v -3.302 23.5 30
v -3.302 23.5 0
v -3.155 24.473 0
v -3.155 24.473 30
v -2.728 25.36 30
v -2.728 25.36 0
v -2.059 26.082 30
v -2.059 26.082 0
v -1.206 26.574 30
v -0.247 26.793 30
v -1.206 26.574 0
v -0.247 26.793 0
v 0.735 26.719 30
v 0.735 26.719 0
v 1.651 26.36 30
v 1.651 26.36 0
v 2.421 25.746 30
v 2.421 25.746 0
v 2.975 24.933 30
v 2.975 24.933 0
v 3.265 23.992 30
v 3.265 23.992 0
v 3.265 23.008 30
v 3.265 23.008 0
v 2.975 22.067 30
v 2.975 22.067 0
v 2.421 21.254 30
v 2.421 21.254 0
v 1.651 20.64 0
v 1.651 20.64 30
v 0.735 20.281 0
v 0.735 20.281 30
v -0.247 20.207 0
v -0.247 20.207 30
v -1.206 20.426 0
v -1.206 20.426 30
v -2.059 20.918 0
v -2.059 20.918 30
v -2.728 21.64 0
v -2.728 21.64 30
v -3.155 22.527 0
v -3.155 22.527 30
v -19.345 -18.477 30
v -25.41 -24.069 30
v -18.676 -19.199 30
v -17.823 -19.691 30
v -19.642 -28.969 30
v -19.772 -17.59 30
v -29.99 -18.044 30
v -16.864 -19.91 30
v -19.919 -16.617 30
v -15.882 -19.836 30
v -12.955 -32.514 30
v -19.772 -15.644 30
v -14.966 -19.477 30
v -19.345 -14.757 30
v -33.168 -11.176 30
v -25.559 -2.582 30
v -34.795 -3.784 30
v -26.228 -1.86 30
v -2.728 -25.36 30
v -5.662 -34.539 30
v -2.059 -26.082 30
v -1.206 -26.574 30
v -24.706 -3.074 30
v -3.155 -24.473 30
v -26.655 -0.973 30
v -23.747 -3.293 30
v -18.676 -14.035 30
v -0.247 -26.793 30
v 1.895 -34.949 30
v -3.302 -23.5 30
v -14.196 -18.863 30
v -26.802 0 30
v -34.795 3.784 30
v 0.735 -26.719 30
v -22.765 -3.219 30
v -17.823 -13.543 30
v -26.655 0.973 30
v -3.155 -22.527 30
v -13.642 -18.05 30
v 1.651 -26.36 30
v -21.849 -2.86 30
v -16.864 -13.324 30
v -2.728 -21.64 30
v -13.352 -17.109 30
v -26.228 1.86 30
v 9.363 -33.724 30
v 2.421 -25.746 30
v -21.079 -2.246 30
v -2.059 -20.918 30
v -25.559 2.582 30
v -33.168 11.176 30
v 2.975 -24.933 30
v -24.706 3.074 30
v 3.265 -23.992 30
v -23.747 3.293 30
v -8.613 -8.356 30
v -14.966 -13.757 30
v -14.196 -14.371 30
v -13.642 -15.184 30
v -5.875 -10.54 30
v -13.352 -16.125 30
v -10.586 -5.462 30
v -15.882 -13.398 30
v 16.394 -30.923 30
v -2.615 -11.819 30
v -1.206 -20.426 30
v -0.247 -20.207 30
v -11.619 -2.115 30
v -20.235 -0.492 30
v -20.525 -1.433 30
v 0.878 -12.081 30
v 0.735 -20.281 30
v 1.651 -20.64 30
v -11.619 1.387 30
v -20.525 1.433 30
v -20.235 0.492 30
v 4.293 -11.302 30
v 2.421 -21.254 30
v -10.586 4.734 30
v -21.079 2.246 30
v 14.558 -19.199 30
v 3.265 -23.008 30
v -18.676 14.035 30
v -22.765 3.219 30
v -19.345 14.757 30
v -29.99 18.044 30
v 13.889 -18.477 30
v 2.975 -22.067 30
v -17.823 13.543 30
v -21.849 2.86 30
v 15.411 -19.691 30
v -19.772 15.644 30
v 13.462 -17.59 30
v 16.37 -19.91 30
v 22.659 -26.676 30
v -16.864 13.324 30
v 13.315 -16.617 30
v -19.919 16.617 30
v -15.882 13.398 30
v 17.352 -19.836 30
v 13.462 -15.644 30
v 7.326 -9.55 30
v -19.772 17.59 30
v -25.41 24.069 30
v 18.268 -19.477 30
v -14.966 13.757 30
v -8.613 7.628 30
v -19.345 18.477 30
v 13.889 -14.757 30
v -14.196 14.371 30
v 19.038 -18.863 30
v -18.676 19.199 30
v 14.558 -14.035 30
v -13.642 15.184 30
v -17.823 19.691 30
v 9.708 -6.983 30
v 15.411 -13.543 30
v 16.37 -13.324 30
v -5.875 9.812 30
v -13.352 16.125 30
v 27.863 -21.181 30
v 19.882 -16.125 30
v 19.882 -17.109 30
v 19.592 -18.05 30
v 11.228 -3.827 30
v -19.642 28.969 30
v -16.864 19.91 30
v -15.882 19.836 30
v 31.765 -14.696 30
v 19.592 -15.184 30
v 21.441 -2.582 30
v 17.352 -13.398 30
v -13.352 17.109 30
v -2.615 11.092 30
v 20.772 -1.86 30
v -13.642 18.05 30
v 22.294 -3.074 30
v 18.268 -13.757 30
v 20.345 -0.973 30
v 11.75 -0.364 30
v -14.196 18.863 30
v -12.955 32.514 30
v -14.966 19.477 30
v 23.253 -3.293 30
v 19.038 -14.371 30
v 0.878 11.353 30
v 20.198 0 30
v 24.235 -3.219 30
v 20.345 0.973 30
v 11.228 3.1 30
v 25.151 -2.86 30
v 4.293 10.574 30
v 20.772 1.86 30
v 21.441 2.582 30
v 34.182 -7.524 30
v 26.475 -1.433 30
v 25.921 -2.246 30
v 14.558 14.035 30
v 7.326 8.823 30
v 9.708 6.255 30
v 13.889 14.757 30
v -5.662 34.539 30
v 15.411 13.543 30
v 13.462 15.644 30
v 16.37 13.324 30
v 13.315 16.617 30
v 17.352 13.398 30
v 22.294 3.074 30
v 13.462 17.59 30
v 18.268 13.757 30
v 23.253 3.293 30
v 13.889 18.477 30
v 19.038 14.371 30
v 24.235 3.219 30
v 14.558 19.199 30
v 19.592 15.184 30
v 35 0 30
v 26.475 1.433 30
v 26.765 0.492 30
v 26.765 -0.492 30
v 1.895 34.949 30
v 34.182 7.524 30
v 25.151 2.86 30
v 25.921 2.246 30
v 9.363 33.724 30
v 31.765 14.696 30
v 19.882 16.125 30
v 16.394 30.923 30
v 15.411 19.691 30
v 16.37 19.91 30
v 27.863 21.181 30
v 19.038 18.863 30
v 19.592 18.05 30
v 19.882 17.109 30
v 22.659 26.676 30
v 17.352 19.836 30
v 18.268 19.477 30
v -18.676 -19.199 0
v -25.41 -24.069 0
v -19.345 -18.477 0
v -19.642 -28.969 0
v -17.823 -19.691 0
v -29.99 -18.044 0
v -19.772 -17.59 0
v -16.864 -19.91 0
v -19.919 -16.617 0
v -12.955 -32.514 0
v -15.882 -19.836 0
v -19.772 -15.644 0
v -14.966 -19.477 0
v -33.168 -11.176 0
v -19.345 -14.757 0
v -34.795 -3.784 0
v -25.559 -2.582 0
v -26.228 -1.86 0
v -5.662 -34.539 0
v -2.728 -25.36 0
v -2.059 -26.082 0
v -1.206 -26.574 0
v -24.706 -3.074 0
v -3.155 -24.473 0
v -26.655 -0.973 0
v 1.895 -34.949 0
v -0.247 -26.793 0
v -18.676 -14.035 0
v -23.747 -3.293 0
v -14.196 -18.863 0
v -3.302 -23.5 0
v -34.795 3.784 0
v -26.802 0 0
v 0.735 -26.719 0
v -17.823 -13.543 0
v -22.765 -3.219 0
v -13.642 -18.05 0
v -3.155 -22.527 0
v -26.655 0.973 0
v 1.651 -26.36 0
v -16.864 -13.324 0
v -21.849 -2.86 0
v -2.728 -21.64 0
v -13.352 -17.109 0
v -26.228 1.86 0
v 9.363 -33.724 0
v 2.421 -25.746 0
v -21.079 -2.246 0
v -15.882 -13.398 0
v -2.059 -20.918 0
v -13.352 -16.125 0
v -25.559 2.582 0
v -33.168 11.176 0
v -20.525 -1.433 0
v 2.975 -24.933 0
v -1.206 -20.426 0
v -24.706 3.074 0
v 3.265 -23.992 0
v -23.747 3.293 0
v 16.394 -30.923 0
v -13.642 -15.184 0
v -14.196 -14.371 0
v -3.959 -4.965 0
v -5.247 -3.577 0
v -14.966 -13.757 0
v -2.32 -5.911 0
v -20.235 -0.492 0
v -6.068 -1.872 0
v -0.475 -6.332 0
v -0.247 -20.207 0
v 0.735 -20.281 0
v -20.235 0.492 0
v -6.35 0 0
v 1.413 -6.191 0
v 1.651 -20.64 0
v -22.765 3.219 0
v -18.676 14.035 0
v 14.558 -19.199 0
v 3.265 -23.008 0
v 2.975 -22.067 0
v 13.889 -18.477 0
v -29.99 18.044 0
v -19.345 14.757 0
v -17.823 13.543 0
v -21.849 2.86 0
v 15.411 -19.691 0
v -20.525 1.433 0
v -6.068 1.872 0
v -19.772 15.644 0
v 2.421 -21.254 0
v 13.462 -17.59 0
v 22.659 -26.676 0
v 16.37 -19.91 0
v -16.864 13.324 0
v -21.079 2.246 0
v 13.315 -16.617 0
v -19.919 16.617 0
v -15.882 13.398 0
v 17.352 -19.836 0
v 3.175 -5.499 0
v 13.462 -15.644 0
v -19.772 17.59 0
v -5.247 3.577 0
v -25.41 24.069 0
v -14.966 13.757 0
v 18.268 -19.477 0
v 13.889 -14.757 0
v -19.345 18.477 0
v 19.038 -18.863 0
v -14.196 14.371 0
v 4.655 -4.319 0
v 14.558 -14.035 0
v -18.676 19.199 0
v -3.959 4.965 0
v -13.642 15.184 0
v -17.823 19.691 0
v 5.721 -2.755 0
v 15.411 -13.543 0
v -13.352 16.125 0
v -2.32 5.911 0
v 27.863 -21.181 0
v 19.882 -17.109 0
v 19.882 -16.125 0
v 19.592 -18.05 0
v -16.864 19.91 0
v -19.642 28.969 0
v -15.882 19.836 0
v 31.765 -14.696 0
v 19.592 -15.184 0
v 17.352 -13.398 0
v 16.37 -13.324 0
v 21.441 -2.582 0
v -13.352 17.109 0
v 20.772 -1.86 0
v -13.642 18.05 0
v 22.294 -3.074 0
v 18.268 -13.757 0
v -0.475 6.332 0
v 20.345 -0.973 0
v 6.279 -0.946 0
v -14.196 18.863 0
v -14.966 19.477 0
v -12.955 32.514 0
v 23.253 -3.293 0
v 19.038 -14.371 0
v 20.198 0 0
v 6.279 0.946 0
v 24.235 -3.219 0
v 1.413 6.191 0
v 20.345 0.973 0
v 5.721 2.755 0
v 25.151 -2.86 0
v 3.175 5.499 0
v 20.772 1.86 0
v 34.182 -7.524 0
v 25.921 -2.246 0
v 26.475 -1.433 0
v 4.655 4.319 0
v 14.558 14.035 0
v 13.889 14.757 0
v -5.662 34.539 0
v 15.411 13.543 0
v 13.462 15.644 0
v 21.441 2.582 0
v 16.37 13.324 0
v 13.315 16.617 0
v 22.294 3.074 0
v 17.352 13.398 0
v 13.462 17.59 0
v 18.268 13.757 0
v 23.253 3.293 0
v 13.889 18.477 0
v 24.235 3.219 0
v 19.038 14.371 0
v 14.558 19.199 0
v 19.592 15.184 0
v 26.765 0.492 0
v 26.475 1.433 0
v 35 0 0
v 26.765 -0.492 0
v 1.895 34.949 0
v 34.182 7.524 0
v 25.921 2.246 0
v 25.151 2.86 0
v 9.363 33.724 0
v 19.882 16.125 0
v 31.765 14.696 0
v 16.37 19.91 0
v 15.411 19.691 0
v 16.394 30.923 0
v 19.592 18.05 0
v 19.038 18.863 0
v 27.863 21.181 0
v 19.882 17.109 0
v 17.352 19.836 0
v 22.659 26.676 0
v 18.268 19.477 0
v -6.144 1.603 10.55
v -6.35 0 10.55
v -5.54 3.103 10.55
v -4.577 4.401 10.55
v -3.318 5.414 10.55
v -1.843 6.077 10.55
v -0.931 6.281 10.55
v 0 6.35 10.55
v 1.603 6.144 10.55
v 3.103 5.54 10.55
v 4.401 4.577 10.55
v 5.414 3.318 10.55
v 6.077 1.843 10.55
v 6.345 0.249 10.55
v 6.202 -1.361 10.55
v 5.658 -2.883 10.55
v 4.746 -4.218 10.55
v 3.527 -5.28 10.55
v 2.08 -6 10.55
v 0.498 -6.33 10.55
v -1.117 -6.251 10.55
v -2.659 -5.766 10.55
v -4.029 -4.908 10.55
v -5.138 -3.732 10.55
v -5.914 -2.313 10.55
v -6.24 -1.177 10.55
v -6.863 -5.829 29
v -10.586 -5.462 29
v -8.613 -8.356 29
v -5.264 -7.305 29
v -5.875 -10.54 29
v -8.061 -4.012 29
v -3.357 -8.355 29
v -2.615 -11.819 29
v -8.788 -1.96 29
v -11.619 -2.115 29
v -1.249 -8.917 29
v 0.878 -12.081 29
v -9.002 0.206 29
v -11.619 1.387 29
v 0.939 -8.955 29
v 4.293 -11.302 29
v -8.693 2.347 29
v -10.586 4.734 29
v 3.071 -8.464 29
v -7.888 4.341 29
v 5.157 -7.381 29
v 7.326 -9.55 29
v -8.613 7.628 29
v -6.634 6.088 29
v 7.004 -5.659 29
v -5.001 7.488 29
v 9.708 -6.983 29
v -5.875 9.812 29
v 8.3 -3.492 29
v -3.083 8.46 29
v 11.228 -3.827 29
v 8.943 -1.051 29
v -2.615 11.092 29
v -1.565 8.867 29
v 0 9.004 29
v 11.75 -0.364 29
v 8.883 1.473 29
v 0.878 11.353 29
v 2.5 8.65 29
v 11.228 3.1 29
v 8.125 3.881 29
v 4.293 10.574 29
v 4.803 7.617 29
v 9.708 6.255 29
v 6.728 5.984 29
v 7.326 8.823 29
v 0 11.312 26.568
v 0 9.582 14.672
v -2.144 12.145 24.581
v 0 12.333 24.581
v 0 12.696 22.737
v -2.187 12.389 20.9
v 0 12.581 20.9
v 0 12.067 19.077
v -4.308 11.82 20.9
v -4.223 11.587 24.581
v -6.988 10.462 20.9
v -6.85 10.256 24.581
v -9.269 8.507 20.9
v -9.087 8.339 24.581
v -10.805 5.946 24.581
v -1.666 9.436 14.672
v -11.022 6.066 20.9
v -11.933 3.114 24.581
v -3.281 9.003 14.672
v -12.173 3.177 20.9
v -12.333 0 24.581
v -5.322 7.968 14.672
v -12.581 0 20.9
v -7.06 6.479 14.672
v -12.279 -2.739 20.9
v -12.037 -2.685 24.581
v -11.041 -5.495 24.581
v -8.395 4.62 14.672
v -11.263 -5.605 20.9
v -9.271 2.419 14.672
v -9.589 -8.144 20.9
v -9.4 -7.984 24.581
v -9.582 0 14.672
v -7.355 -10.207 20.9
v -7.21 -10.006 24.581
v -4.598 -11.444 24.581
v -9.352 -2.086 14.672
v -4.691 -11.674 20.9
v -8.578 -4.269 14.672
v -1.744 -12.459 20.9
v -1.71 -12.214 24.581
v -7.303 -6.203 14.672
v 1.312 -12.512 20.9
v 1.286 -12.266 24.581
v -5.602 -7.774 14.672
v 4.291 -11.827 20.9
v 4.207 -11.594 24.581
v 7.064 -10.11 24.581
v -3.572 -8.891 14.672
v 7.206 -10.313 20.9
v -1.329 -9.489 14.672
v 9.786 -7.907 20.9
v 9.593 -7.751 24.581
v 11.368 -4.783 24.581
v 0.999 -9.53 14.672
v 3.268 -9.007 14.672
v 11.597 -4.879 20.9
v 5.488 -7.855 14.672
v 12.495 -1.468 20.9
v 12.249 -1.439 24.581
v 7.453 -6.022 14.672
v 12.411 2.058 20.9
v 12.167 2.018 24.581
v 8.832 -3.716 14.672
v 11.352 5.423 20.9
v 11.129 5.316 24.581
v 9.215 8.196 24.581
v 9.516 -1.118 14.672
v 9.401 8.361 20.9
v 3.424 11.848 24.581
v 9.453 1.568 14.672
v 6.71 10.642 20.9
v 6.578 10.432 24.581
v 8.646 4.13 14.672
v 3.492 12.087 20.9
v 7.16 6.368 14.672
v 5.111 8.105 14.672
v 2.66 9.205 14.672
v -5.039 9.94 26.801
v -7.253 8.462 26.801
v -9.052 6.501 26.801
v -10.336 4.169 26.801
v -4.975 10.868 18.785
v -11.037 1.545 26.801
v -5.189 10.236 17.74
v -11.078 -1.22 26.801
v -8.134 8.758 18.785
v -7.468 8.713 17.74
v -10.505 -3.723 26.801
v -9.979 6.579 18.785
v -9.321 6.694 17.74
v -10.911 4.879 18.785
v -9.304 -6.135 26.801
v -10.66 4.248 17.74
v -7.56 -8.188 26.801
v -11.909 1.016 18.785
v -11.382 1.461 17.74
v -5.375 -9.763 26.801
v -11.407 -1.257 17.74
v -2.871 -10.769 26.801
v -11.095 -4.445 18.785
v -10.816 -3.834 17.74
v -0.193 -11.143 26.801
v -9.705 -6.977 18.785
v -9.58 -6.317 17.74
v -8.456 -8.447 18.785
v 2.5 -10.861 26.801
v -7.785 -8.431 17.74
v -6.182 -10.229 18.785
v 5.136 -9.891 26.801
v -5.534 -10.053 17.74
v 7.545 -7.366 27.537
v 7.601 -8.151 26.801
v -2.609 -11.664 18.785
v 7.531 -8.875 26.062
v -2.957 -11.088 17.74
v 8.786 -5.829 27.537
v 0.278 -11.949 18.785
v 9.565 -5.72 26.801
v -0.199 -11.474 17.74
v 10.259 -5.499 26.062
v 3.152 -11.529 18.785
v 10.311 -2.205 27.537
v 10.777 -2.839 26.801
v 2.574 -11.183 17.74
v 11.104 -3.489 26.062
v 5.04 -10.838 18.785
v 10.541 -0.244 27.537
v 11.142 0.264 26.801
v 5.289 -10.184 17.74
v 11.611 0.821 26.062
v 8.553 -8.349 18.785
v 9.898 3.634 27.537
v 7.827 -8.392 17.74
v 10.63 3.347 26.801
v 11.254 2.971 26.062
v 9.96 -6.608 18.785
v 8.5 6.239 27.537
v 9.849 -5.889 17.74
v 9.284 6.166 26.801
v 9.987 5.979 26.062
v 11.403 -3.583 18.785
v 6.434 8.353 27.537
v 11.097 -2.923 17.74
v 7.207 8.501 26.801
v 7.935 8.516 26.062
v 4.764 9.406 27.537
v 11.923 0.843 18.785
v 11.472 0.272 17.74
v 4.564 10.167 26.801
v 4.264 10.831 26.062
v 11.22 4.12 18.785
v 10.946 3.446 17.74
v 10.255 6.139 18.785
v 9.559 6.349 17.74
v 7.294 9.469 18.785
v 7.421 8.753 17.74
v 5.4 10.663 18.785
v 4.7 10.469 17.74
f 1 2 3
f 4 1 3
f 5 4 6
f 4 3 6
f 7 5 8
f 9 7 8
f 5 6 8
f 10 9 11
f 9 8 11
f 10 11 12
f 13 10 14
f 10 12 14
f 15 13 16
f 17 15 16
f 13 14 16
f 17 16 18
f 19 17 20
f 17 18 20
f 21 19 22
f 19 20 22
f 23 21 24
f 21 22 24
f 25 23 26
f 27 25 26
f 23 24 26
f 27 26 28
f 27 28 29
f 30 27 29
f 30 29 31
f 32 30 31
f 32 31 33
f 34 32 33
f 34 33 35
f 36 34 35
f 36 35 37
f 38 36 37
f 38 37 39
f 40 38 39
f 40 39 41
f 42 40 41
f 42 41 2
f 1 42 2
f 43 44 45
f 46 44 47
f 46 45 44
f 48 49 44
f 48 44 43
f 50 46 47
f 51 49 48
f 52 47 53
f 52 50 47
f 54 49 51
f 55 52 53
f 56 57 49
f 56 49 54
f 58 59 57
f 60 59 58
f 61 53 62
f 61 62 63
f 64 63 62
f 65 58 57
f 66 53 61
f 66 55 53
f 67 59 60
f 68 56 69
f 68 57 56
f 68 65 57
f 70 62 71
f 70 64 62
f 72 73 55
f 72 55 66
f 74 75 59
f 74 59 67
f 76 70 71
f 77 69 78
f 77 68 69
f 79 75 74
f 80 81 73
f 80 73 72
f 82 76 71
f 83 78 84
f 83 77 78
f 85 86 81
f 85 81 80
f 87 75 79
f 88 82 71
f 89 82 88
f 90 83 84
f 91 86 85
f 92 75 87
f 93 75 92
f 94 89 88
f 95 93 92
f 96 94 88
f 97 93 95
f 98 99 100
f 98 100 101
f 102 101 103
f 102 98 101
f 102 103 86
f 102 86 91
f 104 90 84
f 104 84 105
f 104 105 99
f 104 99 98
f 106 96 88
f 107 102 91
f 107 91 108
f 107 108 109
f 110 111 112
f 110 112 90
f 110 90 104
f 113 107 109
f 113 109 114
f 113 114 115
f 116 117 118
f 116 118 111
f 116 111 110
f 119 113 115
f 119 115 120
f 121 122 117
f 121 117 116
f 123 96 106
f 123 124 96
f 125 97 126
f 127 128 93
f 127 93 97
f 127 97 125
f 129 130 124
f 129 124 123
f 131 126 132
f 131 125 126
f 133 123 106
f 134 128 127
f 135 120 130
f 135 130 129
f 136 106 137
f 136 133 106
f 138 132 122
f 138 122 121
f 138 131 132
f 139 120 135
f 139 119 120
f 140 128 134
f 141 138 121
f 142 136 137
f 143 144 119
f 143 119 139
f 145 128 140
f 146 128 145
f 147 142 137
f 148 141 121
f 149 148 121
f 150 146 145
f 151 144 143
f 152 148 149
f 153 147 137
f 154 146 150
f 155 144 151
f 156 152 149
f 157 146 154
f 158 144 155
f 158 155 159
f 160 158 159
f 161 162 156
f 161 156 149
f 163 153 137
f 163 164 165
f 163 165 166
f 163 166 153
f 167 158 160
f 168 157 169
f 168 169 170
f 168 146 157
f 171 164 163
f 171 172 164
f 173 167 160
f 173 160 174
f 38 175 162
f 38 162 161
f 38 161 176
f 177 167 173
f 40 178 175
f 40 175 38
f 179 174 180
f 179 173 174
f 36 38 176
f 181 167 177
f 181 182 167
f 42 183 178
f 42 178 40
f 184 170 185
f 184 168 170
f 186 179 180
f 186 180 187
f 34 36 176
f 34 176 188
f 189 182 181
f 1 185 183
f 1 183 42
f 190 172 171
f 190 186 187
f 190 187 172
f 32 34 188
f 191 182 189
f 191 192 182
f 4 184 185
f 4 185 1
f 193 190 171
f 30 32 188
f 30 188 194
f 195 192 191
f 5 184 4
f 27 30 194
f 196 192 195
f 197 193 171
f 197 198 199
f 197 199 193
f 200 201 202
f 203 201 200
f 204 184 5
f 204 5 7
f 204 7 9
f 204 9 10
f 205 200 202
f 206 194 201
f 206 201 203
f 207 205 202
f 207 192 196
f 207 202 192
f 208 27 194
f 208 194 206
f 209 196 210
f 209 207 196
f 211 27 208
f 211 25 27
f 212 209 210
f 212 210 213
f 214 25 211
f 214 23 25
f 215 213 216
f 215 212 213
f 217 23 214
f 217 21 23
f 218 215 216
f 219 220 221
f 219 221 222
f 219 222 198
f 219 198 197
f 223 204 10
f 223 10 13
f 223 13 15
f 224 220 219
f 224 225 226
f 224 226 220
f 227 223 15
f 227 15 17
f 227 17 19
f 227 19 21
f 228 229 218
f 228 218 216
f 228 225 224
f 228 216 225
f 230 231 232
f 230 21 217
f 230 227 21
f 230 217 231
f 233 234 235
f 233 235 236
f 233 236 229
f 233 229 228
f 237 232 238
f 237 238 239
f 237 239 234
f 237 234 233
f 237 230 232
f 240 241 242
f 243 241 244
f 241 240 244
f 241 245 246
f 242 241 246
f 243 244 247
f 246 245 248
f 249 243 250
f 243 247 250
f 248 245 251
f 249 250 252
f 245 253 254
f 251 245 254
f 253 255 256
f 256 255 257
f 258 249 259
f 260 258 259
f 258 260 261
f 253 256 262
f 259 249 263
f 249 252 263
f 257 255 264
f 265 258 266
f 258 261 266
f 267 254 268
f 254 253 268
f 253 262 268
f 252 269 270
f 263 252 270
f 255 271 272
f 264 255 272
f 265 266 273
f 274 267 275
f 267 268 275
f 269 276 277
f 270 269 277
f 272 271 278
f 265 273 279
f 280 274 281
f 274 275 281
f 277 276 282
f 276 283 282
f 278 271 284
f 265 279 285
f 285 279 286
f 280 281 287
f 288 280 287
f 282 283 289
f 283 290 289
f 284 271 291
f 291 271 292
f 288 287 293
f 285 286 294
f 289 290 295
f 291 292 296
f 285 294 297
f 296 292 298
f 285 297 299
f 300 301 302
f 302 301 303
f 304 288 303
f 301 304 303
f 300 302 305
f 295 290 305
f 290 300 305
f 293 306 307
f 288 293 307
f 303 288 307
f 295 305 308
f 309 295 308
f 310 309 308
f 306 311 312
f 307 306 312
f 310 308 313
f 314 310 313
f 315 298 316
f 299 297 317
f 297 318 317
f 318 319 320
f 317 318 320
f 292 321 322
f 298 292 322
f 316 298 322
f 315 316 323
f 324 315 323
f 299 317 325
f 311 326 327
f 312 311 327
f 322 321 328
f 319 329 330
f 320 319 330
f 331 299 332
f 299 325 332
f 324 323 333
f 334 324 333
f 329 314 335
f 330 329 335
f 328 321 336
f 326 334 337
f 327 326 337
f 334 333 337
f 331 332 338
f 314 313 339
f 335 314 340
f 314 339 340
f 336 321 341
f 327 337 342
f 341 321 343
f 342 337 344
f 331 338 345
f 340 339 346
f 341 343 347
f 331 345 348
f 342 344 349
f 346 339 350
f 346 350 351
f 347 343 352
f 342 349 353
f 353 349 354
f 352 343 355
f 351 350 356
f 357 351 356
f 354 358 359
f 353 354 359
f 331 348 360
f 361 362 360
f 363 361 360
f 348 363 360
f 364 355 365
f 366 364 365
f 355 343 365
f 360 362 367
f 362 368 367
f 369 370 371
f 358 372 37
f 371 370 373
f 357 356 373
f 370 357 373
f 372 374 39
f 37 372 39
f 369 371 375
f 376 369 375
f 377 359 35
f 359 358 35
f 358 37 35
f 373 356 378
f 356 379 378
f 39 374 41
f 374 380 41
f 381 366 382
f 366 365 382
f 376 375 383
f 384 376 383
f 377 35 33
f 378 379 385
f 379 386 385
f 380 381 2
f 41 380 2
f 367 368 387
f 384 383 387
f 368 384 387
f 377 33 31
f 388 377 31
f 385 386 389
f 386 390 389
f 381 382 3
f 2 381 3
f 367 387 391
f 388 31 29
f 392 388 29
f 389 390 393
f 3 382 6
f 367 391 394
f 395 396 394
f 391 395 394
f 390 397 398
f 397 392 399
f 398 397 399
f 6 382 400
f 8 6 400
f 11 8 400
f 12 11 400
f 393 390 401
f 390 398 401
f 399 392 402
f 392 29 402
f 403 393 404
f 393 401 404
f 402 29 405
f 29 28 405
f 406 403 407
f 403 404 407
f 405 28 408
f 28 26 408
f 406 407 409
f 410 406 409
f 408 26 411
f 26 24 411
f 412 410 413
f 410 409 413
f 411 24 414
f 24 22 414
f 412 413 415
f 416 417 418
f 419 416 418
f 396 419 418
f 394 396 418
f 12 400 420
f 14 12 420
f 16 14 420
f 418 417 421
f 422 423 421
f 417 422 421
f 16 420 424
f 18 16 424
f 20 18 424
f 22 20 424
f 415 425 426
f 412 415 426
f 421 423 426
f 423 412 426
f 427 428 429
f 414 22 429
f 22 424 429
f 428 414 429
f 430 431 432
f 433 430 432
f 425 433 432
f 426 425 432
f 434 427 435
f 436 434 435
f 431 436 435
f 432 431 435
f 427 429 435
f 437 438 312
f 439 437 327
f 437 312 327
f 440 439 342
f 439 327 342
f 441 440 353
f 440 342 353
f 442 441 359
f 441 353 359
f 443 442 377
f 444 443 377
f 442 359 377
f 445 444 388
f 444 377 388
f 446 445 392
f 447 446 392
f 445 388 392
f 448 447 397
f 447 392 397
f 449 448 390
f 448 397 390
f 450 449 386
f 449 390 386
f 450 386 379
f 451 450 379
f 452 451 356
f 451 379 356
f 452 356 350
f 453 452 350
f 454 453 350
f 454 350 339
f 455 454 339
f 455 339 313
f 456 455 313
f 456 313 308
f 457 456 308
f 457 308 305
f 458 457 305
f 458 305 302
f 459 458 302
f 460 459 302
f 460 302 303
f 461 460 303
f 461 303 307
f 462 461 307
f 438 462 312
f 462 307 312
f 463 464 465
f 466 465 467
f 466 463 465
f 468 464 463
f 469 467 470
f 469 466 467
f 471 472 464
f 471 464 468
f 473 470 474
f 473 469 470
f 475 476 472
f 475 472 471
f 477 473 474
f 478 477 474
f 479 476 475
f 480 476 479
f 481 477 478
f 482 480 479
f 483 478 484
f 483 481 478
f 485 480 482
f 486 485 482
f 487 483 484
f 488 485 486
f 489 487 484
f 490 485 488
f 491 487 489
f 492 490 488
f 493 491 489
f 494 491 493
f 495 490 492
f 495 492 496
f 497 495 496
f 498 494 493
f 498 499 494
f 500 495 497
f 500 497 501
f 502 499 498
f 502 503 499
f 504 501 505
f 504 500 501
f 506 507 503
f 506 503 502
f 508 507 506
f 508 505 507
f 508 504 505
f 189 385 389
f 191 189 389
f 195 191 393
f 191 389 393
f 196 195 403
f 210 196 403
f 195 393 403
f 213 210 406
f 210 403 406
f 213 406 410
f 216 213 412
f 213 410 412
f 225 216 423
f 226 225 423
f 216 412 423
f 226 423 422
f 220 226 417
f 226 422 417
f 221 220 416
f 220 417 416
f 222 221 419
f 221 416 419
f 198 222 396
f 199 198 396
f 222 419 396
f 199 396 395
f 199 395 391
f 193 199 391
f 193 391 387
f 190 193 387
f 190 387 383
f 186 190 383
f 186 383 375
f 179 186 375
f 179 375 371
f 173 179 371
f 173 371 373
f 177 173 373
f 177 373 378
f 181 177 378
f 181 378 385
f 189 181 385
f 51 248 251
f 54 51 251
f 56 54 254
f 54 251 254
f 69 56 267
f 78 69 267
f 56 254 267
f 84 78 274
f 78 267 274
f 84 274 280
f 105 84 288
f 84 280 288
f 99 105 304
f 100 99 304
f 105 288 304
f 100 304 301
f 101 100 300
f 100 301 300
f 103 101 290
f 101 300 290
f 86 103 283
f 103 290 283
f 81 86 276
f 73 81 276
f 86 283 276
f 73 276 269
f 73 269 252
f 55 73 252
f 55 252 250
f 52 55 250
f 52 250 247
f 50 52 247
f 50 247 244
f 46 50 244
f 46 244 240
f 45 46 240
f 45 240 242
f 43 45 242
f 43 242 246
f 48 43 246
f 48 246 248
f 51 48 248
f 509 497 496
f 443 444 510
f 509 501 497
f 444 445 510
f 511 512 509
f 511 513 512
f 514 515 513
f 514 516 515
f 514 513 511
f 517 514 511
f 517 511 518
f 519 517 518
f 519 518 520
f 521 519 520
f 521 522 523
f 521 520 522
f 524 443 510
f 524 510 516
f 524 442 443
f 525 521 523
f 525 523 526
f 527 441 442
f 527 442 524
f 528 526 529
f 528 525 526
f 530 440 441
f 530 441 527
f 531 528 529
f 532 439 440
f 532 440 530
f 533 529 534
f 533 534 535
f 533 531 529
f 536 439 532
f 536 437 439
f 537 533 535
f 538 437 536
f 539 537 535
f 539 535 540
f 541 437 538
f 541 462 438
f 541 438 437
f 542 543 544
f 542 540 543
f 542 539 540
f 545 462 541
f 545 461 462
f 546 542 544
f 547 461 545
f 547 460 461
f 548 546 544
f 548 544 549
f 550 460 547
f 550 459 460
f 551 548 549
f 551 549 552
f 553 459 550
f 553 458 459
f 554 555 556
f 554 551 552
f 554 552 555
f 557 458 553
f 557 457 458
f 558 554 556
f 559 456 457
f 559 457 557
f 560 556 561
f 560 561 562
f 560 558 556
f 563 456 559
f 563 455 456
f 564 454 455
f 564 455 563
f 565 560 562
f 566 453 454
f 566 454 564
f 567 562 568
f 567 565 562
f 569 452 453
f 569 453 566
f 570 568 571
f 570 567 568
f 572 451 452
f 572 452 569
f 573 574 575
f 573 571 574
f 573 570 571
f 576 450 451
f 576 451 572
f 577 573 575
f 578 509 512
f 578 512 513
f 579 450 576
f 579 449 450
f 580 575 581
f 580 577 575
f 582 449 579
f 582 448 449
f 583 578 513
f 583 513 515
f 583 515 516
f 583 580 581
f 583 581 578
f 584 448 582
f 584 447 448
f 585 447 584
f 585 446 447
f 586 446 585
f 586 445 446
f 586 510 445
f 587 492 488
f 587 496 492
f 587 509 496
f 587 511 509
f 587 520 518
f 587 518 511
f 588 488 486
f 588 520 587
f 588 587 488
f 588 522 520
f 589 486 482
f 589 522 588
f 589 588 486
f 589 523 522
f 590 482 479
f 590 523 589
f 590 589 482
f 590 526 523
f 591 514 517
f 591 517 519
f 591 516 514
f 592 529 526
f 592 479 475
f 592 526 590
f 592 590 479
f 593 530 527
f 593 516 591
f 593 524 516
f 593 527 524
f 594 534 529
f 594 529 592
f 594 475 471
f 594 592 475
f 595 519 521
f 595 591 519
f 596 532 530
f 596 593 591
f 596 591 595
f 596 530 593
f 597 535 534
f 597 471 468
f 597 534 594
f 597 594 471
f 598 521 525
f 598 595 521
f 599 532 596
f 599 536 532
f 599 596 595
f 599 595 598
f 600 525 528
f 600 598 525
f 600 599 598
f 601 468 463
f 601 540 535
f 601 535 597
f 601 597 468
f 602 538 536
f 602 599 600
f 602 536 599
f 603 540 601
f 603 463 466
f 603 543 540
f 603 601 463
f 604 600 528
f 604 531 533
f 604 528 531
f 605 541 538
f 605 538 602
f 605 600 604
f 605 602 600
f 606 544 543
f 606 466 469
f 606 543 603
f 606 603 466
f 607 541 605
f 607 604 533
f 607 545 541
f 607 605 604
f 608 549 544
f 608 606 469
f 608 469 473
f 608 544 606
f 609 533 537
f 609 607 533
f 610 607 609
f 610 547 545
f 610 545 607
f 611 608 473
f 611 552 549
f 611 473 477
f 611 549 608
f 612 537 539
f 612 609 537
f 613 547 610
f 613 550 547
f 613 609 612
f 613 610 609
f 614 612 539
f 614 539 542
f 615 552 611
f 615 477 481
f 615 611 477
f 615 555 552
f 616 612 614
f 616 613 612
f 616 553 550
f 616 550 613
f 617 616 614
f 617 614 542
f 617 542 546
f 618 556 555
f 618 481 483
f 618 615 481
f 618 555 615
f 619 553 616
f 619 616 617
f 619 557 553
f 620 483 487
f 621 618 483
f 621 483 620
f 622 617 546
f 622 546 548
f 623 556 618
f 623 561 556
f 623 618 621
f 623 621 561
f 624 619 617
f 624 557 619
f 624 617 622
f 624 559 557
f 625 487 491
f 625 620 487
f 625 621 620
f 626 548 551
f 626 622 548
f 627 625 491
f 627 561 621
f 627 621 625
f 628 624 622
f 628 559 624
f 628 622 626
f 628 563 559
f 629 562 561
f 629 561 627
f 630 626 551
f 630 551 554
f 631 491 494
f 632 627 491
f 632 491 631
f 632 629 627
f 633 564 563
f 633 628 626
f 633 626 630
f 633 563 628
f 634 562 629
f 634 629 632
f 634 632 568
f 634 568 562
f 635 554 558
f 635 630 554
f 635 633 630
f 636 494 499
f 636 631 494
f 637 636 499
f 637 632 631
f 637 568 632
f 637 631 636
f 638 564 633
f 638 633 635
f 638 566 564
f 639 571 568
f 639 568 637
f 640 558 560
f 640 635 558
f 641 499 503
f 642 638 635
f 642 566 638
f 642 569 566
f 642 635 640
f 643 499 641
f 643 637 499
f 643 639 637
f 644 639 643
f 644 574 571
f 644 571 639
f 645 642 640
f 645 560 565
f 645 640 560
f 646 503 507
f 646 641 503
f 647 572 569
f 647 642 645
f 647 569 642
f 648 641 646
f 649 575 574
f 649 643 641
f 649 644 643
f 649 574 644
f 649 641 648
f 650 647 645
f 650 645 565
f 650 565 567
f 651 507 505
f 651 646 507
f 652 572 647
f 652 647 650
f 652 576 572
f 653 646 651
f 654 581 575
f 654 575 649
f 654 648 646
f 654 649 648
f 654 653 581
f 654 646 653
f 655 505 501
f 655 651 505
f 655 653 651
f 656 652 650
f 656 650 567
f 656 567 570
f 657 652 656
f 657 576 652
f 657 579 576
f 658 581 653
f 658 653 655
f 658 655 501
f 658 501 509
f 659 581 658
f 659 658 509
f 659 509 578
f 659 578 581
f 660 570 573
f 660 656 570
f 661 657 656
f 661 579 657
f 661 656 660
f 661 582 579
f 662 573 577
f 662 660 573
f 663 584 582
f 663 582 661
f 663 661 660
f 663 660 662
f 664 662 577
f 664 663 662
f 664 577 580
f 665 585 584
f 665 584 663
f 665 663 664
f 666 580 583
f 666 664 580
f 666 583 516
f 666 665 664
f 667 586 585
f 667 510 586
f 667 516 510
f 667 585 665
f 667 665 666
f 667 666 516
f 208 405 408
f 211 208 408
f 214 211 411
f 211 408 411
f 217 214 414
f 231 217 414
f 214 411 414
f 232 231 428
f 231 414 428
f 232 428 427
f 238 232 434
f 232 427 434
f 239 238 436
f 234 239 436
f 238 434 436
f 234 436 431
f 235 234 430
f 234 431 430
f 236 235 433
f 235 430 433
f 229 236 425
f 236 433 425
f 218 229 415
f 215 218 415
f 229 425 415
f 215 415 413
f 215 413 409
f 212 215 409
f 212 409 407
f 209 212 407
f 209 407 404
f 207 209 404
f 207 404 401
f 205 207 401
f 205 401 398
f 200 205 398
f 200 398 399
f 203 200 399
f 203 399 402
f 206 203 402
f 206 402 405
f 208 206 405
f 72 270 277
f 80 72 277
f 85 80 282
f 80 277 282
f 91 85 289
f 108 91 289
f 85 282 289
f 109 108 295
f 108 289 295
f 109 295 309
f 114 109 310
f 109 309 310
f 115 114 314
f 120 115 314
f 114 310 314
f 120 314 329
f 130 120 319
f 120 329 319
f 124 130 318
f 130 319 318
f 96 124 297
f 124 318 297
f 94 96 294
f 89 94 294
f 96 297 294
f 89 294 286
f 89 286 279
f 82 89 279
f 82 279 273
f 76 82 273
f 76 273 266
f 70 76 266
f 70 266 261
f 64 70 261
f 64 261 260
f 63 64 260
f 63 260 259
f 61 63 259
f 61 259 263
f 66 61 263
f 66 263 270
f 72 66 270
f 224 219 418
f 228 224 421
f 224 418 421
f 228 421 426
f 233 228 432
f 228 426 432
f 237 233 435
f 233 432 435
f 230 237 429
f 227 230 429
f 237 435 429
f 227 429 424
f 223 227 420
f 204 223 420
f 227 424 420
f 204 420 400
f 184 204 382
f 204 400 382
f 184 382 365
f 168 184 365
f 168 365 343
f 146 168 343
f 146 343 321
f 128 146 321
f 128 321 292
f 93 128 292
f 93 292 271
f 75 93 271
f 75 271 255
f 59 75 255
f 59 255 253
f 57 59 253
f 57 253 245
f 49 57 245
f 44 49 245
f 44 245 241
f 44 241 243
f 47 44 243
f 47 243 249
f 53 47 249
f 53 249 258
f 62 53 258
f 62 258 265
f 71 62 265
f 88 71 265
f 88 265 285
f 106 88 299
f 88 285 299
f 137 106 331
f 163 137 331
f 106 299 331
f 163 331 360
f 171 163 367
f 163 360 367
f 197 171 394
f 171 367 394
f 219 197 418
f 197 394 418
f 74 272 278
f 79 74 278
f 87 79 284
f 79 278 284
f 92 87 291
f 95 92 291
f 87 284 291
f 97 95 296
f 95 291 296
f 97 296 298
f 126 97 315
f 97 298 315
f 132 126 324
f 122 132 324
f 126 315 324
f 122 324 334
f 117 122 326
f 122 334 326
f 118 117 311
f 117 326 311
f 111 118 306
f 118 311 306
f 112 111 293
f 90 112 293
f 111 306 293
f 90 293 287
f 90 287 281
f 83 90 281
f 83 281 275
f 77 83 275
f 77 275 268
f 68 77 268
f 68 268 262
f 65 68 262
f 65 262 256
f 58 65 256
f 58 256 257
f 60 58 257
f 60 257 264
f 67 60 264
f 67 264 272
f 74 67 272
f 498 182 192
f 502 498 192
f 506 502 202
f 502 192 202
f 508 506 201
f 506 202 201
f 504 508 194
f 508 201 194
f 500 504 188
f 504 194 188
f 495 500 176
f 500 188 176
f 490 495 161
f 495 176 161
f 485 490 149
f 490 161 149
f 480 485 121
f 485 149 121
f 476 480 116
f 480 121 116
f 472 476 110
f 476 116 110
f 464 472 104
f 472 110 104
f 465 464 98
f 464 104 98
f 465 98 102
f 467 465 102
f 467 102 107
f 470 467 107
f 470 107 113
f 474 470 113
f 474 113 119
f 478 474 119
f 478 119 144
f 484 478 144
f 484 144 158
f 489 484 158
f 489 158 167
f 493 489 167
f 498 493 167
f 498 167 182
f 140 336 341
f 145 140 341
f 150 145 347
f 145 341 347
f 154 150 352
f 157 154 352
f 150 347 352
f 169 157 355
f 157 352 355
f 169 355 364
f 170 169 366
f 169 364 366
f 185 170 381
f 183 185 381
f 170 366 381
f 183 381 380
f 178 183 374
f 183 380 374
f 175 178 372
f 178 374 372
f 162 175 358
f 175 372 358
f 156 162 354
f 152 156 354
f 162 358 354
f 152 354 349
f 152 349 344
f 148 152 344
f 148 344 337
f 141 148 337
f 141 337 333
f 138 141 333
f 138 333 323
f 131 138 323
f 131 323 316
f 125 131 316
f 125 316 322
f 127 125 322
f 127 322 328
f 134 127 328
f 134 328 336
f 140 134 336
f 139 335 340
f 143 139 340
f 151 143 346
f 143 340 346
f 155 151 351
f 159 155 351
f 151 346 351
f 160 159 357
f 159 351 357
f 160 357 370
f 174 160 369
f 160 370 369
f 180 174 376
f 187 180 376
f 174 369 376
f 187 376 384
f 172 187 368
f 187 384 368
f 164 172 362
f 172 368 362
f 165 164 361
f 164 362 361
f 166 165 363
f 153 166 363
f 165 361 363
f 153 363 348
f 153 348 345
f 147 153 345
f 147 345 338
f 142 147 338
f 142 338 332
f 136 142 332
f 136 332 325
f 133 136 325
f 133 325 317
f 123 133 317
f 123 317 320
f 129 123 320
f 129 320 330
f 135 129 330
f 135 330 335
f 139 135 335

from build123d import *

# Parameters (mm, degrees)
SKETCH1_R           = 35
BOSS_EXTRUDE1_DEPTH = 50
SKETCH2_R           = 11.75
CUT_EXTRUDE1_DEPTH  = 21
SKETCH3_R           = 9
CUT_EXTRUDE2_DEPTH  = 5
SKETCH6_R           = 6.35
CUT_EXTRUDE3_DEPTH  = 71.356236397
CUT_EXTRUDE4_START  = -20
SKETCH7_R           = 35
CUT_EXTRUDE4_DEPTH  = 20
SKETCH9_R           = 3.302
CUT_EXTRUDE6_DEPTH  = 58.879184514


with BuildPart() as part:
    # Sketch1 → Boss-Extrude1 (new body)
    with BuildSketch(Plane.XY):
        Circle(SKETCH1_R)
    extrude(amount=BOSS_EXTRUDE1_DEPTH)

    # Sketch2 → Cut-Extrude1 (cut)
    with BuildSketch(Plane.XY.offset(50)):
        with Locations((0, -0.363798412)):
            Circle(SKETCH2_R)
    extrude(amount=-CUT_EXTRUDE1_DEPTH, mode=Mode.SUBTRACT)

    # Sketch3 → Cut-Extrude2 (cut)
    with BuildSketch(Plane.XY.offset(29)):
        Circle(SKETCH3_R)
    extrude(amount=-CUT_EXTRUDE2_DEPTH, mode=Mode.SUBTRACT)

    # Sketch4 → Cut-Revolve1 (revolve, cut)
    with BuildSketch(Plane(origin=(0, 0, 0), x_dir=(0, 0, -1), z_dir=(1, 0, 0))):
        with BuildLine():
            Line((-8.85349547, 5), (-8.85349547, 0))
            Line((-8.85349547, 0), (-29.014540537, 0))
            Line((-29.014540537, 0), (-29.014540537, 8.986487334))
            add(Edge.make_bspline(
                [(-29.014540537, 8.986487334), (-22.084577695, 17.461249934), (-14.611301832, 9.423177176), (-8.85349547, 5)],
                knots=[0, 0, 0, 0, 1, 1, 1, 1], degree=3))
        make_face()
    revolve(axis=Axis((0, 0, 8.85349547), (0, 0, 1)), mode=Mode.SUBTRACT)

    # Sketch6 → Cut-Extrude3 (cut, through all)
    with BuildSketch(Plane(origin=(0, 0, 0), x_dir=(-1, 0, 0), z_dir=(0, 0, -1))):
        Circle(SKETCH6_R)
    extrude(amount=-CUT_EXTRUDE3_DEPTH, mode=Mode.SUBTRACT)

    # Sketch7 → Cut-Extrude4 (cut)
    with BuildSketch(Plane.XY.offset(50).offset(CUT_EXTRUDE4_START)):
        Circle(SKETCH7_R)
    extrude(amount=CUT_EXTRUDE4_DEPTH, mode=Mode.SUBTRACT)

    # Sketch9 → Cut-Extrude6 (cut, through all)
    with BuildSketch(Plane(origin=(0, 0, 0), x_dir=(-1, 0, 0), z_dir=(0, 0, -1))):
        with Locations((0, -23.5)):
            Circle(SKETCH9_R)
        with Locations((-16.617009358, -16.617009358)):
            Circle(SKETCH9_R)
        with Locations((-23.5, 0)):
            Circle(SKETCH9_R)
        with Locations((-16.617009358, 16.617009358)):
            Circle(SKETCH9_R)
        with Locations((0, 23.5)):
            Circle(SKETCH9_R)
        with Locations((16.617009358, 16.617009358)):
            Circle(SKETCH9_R)
        with Locations((23.5, 0)):
            Circle(SKETCH9_R)
        with Locations((16.617009358, -16.617009358)):
            Circle(SKETCH9_R)
    extrude(amount=-CUT_EXTRUDE6_DEPTH, mode=Mode.SUBTRACT)


solid = part.part
